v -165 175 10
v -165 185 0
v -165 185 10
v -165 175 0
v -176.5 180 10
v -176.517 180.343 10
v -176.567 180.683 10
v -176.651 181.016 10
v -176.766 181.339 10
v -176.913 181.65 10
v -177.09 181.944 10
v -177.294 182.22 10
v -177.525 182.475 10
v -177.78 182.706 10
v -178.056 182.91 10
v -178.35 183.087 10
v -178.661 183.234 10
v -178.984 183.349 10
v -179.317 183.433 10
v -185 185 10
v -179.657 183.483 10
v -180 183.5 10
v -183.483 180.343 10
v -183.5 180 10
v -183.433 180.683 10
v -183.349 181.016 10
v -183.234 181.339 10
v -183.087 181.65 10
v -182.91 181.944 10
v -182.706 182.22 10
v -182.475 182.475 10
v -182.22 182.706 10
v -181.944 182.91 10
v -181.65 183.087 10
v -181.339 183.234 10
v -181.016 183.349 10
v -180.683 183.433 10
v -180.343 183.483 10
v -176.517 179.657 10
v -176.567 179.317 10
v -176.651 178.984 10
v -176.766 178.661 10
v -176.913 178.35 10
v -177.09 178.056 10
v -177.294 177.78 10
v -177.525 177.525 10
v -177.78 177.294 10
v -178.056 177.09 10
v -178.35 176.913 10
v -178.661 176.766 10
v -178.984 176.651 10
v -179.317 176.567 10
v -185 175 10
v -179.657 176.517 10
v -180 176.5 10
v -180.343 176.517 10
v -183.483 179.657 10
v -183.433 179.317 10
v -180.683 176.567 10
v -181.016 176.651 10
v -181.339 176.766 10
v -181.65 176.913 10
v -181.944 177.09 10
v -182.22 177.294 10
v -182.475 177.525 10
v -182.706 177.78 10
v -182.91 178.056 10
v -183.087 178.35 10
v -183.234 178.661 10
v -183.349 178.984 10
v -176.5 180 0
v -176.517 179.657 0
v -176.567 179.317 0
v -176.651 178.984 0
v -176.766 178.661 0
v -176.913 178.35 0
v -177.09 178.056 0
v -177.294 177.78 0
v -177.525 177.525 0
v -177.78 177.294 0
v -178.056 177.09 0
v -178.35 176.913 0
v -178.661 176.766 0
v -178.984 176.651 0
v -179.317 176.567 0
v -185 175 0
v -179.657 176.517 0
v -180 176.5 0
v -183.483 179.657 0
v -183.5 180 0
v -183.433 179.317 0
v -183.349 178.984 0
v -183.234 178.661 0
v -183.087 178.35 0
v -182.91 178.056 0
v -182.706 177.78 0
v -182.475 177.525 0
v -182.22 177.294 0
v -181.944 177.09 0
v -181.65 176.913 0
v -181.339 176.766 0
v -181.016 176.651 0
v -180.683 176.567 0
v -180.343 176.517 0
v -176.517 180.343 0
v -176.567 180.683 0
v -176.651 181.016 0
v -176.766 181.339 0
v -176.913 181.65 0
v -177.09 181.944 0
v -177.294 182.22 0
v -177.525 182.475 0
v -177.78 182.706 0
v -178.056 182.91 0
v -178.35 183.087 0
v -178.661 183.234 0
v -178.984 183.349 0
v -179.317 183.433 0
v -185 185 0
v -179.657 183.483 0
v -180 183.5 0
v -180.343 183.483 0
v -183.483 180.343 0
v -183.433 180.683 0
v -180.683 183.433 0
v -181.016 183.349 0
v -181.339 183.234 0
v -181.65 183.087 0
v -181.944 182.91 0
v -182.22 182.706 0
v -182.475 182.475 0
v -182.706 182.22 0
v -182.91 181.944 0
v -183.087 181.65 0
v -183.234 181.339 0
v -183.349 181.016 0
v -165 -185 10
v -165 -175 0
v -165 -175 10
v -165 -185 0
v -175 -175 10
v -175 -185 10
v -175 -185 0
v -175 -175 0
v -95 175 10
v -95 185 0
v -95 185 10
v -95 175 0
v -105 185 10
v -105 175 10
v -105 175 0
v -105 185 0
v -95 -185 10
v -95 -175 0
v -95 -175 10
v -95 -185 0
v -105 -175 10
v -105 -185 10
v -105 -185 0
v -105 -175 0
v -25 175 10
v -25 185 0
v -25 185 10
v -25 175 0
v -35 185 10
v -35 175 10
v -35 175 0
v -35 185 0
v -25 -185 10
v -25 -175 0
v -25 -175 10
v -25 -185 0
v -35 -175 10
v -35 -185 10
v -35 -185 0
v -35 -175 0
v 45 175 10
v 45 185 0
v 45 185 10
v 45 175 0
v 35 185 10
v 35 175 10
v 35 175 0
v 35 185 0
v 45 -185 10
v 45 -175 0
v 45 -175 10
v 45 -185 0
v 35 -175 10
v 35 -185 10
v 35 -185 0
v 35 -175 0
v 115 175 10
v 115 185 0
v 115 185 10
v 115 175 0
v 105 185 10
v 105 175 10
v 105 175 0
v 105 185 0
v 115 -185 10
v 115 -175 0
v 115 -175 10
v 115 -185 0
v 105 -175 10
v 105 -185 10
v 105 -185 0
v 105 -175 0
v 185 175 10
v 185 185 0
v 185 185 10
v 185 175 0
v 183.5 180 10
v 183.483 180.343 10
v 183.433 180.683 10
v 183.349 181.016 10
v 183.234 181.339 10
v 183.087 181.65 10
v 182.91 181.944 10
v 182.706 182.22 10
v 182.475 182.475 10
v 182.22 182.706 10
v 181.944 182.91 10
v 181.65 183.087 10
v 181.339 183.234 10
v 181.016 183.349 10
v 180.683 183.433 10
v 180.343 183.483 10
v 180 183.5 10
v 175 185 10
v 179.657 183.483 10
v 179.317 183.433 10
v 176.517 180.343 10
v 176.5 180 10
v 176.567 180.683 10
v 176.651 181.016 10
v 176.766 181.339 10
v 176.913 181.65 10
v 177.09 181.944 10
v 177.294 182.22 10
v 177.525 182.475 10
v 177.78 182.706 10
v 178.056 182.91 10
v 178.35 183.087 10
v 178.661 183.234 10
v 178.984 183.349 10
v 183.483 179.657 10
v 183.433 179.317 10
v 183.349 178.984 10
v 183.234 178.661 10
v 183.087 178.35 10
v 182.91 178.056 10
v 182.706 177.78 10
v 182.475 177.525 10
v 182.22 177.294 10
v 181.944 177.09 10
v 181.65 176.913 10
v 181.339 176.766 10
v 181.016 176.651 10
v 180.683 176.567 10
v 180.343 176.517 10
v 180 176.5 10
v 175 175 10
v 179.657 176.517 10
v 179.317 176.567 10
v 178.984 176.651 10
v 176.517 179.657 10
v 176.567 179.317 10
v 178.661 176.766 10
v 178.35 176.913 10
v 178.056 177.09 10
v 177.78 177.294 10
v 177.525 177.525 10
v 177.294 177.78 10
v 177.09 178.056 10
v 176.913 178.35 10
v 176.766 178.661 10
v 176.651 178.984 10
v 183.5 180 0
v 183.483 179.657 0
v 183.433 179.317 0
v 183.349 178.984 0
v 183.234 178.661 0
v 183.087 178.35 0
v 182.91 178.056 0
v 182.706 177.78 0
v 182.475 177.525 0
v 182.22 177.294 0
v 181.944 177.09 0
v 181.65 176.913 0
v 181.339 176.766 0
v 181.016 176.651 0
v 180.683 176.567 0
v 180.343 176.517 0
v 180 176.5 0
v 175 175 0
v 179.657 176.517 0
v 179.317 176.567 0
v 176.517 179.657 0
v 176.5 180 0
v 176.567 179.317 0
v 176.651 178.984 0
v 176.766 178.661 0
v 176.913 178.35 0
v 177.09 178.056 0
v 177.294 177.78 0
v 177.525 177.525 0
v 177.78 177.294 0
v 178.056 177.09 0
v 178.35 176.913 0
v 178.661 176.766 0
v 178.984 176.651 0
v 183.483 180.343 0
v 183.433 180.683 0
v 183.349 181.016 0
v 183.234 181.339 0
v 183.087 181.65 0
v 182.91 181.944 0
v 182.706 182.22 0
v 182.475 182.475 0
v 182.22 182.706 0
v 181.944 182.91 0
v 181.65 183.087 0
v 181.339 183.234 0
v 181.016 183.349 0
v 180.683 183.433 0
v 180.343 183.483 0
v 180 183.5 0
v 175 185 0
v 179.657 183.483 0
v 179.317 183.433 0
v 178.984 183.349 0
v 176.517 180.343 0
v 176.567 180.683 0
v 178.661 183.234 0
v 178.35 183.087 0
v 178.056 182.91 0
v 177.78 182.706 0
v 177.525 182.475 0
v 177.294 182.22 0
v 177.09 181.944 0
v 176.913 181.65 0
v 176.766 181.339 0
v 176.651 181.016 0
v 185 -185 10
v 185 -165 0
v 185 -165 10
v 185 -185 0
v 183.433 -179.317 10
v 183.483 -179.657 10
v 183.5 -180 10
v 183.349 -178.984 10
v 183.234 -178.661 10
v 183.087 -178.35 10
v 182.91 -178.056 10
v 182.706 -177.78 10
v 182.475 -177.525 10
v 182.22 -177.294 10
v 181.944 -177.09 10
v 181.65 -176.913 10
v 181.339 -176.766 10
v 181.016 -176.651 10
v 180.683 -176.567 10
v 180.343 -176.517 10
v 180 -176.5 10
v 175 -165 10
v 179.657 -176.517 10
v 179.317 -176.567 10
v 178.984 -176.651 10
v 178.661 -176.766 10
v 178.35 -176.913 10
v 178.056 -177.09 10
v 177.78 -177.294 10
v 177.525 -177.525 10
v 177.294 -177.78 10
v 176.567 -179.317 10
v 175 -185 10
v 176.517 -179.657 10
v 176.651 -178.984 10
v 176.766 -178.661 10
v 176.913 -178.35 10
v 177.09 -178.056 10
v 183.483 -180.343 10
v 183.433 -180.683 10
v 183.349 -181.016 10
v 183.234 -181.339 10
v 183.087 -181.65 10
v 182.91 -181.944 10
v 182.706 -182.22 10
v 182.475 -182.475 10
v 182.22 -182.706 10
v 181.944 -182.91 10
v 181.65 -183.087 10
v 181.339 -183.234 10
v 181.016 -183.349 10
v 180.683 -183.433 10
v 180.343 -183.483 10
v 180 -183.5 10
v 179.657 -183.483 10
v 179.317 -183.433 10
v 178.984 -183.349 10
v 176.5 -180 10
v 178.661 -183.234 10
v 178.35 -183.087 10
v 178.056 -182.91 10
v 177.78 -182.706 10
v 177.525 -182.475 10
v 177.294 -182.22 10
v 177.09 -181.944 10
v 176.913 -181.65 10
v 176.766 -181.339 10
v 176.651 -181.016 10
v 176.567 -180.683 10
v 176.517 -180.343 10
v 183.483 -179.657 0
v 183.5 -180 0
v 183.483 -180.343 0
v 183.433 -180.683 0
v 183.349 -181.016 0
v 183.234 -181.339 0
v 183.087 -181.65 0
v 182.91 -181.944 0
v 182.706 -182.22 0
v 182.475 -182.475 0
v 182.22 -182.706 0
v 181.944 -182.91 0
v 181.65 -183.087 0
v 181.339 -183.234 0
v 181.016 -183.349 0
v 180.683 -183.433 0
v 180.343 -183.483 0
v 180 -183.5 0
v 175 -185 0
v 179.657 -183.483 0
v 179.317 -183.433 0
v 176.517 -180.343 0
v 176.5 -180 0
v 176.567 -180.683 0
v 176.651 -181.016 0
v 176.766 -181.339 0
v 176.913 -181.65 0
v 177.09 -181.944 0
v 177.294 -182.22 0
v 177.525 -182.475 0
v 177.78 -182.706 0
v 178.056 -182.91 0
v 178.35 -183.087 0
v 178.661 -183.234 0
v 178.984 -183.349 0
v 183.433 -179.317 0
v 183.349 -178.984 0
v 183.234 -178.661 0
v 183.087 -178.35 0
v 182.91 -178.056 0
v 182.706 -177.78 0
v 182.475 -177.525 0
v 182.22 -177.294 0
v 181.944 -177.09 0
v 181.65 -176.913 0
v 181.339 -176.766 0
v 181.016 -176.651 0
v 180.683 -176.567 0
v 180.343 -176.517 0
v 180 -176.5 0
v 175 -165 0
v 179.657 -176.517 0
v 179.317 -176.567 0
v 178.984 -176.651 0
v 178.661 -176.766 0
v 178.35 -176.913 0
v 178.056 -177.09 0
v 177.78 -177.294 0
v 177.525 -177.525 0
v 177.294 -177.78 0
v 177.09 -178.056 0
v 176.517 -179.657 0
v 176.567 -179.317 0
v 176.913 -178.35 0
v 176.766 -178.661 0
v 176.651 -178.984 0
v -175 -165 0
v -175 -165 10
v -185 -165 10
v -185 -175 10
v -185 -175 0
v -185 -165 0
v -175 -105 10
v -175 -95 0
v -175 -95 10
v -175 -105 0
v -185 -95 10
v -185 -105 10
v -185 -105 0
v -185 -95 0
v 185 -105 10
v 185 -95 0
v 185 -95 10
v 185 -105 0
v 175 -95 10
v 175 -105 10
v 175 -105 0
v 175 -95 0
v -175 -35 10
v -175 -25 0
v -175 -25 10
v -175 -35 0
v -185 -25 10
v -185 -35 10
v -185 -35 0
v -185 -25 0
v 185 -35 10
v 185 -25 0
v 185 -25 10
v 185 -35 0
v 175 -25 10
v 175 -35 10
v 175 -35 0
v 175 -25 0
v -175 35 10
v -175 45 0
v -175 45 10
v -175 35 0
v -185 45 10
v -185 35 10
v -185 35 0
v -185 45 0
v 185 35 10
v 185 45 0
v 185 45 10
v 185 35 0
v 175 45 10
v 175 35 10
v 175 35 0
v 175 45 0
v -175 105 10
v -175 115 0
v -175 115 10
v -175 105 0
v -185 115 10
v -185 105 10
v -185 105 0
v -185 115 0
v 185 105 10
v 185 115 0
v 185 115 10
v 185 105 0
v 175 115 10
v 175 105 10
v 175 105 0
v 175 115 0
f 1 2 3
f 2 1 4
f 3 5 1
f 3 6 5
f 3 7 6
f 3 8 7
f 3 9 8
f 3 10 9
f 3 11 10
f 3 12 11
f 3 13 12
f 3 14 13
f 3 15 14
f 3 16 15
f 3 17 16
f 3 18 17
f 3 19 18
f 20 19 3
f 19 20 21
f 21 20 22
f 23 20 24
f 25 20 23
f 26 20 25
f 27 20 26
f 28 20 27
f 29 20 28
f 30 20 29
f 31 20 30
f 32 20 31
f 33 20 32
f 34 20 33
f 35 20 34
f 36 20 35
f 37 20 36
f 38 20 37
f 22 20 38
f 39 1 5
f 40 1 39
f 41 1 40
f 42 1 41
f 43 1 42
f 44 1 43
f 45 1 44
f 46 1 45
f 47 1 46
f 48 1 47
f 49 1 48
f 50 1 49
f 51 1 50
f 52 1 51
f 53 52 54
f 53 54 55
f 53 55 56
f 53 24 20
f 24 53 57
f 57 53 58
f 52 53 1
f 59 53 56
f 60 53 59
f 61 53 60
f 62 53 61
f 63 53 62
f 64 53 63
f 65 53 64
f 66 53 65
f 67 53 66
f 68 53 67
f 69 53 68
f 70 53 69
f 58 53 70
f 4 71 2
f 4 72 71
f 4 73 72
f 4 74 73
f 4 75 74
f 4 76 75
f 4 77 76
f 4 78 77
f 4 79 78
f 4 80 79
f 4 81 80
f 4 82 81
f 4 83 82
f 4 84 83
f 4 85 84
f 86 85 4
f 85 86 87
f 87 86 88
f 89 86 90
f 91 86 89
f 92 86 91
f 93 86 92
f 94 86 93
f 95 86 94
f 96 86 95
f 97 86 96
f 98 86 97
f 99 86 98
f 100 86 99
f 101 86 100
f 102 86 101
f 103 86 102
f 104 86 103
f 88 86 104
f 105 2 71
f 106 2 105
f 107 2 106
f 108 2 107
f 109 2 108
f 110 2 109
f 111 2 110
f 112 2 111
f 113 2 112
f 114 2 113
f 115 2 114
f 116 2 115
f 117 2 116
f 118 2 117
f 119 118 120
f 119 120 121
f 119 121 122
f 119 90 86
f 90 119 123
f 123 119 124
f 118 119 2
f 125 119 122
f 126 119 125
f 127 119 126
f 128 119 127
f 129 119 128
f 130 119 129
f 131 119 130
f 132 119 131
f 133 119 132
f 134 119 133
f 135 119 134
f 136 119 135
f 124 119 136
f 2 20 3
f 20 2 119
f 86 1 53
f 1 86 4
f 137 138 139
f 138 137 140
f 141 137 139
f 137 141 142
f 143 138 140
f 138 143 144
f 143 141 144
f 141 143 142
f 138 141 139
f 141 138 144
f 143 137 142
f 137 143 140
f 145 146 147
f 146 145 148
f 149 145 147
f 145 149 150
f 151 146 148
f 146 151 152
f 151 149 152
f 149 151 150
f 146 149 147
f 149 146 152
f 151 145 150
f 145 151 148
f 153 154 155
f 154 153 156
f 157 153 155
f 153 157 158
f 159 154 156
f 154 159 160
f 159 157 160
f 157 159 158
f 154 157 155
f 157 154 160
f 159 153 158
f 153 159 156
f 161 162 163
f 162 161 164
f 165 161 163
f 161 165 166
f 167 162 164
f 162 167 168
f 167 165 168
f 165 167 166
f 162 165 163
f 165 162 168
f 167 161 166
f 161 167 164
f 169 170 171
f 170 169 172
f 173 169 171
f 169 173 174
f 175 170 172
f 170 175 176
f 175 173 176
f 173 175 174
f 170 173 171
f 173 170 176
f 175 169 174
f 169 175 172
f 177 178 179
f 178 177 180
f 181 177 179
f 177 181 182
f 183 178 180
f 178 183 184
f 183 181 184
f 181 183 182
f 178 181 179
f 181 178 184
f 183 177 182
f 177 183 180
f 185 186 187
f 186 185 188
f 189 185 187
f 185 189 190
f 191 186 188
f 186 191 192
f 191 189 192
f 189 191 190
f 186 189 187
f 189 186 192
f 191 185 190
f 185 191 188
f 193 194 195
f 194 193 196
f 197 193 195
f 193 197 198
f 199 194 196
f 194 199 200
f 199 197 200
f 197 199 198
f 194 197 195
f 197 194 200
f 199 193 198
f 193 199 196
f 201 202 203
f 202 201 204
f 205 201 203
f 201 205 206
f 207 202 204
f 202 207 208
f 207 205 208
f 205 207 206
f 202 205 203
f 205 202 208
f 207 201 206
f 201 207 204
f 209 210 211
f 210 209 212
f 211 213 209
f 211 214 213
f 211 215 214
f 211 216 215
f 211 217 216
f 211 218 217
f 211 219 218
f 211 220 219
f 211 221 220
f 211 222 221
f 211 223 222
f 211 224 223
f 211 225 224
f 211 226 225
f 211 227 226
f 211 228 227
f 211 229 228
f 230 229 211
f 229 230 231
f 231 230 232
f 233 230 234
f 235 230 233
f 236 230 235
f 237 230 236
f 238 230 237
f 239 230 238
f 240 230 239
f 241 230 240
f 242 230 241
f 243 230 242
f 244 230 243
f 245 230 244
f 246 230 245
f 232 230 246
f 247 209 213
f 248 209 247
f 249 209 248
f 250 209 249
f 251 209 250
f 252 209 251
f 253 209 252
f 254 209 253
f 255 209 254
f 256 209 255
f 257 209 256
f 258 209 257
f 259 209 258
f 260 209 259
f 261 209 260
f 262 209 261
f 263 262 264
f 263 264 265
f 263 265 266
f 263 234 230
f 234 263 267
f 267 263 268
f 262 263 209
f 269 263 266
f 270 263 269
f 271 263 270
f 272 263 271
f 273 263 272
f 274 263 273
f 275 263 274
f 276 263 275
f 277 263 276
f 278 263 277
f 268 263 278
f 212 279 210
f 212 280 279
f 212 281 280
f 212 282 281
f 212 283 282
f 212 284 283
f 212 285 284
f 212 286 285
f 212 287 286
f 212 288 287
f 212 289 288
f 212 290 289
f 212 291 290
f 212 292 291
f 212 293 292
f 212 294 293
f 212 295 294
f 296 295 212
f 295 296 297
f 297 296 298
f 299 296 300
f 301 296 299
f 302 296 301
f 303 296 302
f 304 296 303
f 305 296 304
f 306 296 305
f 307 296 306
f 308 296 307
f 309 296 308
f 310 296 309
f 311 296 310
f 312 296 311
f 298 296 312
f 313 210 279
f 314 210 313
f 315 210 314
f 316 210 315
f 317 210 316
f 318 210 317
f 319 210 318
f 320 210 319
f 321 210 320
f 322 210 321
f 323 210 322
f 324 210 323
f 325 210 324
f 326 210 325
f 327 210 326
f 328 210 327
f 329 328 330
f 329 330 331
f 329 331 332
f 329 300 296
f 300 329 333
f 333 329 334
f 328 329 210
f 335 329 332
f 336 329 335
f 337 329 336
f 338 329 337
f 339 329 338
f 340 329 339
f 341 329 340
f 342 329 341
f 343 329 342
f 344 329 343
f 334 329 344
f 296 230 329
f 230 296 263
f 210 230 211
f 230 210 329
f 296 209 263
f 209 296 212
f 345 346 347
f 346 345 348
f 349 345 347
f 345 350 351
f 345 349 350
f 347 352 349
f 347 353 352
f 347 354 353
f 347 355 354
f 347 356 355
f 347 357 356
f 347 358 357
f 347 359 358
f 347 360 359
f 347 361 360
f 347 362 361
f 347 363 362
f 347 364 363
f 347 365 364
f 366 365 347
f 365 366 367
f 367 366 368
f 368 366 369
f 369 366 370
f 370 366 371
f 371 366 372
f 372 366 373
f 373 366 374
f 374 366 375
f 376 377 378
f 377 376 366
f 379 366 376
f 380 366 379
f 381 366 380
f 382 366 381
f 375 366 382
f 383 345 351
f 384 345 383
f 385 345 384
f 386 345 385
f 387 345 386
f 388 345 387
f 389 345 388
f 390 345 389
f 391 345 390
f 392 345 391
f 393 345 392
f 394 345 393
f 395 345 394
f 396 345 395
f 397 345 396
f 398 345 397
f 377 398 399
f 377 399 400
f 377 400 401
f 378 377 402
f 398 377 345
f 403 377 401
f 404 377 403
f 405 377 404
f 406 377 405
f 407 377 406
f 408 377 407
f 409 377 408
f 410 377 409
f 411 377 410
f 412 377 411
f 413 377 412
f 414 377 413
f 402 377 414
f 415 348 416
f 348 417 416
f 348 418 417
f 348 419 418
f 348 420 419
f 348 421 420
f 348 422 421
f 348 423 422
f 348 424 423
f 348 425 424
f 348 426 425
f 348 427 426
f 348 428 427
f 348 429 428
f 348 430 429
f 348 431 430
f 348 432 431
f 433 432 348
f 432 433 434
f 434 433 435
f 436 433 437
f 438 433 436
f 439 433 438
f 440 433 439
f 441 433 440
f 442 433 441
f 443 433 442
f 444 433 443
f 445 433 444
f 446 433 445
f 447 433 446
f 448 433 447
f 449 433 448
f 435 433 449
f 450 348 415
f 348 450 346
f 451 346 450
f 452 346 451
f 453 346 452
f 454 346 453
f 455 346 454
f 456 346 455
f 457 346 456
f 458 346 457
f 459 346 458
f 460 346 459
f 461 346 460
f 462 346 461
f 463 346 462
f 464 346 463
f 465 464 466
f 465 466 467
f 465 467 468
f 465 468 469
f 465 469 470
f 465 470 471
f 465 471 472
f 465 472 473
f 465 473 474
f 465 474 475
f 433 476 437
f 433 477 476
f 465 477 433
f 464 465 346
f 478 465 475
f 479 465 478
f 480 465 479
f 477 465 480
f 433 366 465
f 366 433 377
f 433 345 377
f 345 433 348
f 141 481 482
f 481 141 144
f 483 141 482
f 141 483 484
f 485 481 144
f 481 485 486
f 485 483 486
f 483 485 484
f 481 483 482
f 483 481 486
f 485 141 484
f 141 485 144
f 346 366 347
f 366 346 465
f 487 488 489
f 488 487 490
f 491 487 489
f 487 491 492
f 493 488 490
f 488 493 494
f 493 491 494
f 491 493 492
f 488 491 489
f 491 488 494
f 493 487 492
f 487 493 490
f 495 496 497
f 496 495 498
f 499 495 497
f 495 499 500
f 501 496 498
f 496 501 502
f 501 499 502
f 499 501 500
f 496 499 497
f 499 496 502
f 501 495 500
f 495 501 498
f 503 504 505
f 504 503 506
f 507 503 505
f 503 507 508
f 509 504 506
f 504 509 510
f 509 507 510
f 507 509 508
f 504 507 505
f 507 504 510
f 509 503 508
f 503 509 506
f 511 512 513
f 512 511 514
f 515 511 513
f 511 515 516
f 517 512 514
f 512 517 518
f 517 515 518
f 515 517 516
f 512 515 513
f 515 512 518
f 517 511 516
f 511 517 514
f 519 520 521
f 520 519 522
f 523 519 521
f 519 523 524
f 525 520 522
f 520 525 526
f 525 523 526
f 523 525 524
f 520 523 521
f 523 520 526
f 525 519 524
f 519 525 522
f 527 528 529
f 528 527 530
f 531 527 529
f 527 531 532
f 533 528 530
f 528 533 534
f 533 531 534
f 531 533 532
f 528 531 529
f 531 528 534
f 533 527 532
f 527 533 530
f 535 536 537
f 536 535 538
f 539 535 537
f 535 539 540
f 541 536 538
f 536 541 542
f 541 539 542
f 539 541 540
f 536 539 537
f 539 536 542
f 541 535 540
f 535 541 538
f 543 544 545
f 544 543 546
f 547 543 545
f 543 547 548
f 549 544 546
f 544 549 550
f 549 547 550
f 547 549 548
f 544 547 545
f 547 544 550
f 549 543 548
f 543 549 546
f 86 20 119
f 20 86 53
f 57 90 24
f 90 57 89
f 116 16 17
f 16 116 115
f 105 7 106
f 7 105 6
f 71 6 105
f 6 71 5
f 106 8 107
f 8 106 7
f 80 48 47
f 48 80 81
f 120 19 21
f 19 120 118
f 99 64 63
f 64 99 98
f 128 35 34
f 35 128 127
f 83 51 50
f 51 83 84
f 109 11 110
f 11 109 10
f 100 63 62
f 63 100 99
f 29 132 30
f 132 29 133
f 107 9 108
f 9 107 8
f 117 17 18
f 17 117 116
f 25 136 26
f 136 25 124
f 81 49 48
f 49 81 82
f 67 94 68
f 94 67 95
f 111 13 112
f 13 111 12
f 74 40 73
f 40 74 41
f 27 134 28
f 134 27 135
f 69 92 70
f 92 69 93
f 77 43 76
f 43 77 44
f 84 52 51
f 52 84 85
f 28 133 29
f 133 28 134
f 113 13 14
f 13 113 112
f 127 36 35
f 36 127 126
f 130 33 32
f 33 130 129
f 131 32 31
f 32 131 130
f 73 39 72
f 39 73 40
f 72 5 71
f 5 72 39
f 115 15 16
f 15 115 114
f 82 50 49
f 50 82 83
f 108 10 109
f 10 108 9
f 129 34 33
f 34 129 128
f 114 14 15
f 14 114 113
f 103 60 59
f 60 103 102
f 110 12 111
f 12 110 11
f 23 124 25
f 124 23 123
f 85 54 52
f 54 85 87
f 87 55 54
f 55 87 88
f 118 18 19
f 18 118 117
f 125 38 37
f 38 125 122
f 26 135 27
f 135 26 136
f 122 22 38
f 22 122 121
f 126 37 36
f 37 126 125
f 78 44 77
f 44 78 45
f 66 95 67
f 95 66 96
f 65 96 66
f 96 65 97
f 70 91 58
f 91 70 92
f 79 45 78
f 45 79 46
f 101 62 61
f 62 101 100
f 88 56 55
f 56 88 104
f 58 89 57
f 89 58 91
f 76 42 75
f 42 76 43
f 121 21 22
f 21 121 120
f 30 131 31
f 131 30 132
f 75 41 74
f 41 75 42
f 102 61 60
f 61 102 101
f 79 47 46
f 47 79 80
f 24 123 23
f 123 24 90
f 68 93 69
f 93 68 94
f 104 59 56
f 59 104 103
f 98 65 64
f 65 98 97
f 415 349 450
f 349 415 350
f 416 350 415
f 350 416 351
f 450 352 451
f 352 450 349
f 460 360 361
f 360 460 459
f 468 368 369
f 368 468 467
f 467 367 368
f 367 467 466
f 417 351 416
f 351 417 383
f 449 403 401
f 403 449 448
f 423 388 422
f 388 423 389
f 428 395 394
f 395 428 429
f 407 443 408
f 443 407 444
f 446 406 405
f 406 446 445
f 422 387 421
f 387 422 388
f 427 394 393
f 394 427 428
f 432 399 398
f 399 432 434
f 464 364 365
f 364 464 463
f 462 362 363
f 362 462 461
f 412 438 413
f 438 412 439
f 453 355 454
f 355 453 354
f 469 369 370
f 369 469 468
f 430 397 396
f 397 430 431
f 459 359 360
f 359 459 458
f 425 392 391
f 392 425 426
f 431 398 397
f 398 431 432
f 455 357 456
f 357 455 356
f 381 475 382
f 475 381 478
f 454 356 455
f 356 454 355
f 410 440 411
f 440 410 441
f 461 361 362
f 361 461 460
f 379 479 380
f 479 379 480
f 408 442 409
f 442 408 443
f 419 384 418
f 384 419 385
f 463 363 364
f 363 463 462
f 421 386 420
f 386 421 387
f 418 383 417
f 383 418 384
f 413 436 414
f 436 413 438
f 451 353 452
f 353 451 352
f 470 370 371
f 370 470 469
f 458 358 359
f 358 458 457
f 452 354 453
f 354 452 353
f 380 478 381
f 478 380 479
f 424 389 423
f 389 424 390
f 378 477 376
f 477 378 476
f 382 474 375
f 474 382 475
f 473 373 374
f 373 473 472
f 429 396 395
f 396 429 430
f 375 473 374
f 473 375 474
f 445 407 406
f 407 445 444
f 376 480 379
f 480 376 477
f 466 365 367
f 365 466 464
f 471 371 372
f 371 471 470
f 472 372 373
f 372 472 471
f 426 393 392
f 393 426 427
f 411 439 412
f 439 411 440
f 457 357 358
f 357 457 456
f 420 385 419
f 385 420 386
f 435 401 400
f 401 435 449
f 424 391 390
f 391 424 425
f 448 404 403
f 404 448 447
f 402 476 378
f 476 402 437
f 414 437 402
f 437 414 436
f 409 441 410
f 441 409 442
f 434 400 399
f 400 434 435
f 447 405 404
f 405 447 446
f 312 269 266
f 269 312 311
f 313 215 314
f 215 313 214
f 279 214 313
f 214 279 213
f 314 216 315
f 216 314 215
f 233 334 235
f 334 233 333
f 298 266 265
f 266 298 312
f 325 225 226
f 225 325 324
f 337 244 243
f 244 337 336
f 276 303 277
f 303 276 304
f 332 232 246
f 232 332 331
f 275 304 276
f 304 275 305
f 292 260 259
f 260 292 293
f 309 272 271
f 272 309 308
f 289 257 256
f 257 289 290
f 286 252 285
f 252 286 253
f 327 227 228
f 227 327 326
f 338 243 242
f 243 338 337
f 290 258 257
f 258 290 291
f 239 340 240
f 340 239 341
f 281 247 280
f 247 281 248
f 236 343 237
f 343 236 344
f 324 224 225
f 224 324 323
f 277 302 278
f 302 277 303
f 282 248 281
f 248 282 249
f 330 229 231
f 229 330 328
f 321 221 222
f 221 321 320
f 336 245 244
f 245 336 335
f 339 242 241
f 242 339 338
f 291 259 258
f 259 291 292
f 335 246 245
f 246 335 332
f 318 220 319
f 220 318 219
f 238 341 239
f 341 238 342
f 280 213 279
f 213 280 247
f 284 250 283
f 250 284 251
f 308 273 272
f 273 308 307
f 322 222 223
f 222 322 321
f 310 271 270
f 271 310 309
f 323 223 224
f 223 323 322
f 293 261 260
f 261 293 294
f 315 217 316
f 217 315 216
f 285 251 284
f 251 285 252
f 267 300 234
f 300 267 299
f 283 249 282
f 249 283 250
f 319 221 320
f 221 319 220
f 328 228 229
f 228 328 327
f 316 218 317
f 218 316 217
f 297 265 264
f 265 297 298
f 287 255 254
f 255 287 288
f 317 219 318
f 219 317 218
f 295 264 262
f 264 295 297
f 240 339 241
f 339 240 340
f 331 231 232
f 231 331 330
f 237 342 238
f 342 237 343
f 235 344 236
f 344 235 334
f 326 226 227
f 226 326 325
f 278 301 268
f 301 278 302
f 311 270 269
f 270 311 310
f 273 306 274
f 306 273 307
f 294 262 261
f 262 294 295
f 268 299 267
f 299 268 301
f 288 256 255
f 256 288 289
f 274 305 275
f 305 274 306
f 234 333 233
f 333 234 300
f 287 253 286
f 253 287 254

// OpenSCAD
// ring_31.scad - ring index 31 (z bottom = 310 mm)
$fn = 64; bar = 10; half_b = bar/2; outer = 370; half_outer = outer/2;
front_y = 180; back_y = -180; left_x = -180; right_x = 180;
x_centers = [-170, -100, -30, 40, 110, 180];
z_centers = [5, 85, 155, 225, 295, 365, 435, 505, 575, 645, 715]; ring_z = 310;
module place_box(cx, cy, sx, sy) { translate([cx - sx/2, cy - sy/2, 0]) cube([sx, sy, bar]); }

difference() { union() {
    for (x = x_centers) { place_box(x, front_y, bar, bar); place_box(x, back_y, bar, bar); }
    for (y = x_centers) { place_box(left_x, y, bar, bar); place_box(right_x, y, bar, bar); }
    for (zc = z_centers) if ((zc - half_b < ring_z + bar) && (zc + half_b > ring_z)) {
        translate([-half_outer, front_y - half_b, 0]) cube([outer, bar, bar]);
        translate([-half_outer, back_y - half_b, 0])  cube([outer, bar, bar]);
        translate([left_x - half_b, -half_outer, 0])  cube([bar, outer, bar]);
        translate([right_x - half_b, -half_outer, 0]) cube([bar, outer, bar]);
    }
  }
  for (cx = [-180, 180]) for (cy = [-180, 180]) translate([cx, cy, 0]) cylinder(h = bar, r = 3.5, $fn = 64);
}
